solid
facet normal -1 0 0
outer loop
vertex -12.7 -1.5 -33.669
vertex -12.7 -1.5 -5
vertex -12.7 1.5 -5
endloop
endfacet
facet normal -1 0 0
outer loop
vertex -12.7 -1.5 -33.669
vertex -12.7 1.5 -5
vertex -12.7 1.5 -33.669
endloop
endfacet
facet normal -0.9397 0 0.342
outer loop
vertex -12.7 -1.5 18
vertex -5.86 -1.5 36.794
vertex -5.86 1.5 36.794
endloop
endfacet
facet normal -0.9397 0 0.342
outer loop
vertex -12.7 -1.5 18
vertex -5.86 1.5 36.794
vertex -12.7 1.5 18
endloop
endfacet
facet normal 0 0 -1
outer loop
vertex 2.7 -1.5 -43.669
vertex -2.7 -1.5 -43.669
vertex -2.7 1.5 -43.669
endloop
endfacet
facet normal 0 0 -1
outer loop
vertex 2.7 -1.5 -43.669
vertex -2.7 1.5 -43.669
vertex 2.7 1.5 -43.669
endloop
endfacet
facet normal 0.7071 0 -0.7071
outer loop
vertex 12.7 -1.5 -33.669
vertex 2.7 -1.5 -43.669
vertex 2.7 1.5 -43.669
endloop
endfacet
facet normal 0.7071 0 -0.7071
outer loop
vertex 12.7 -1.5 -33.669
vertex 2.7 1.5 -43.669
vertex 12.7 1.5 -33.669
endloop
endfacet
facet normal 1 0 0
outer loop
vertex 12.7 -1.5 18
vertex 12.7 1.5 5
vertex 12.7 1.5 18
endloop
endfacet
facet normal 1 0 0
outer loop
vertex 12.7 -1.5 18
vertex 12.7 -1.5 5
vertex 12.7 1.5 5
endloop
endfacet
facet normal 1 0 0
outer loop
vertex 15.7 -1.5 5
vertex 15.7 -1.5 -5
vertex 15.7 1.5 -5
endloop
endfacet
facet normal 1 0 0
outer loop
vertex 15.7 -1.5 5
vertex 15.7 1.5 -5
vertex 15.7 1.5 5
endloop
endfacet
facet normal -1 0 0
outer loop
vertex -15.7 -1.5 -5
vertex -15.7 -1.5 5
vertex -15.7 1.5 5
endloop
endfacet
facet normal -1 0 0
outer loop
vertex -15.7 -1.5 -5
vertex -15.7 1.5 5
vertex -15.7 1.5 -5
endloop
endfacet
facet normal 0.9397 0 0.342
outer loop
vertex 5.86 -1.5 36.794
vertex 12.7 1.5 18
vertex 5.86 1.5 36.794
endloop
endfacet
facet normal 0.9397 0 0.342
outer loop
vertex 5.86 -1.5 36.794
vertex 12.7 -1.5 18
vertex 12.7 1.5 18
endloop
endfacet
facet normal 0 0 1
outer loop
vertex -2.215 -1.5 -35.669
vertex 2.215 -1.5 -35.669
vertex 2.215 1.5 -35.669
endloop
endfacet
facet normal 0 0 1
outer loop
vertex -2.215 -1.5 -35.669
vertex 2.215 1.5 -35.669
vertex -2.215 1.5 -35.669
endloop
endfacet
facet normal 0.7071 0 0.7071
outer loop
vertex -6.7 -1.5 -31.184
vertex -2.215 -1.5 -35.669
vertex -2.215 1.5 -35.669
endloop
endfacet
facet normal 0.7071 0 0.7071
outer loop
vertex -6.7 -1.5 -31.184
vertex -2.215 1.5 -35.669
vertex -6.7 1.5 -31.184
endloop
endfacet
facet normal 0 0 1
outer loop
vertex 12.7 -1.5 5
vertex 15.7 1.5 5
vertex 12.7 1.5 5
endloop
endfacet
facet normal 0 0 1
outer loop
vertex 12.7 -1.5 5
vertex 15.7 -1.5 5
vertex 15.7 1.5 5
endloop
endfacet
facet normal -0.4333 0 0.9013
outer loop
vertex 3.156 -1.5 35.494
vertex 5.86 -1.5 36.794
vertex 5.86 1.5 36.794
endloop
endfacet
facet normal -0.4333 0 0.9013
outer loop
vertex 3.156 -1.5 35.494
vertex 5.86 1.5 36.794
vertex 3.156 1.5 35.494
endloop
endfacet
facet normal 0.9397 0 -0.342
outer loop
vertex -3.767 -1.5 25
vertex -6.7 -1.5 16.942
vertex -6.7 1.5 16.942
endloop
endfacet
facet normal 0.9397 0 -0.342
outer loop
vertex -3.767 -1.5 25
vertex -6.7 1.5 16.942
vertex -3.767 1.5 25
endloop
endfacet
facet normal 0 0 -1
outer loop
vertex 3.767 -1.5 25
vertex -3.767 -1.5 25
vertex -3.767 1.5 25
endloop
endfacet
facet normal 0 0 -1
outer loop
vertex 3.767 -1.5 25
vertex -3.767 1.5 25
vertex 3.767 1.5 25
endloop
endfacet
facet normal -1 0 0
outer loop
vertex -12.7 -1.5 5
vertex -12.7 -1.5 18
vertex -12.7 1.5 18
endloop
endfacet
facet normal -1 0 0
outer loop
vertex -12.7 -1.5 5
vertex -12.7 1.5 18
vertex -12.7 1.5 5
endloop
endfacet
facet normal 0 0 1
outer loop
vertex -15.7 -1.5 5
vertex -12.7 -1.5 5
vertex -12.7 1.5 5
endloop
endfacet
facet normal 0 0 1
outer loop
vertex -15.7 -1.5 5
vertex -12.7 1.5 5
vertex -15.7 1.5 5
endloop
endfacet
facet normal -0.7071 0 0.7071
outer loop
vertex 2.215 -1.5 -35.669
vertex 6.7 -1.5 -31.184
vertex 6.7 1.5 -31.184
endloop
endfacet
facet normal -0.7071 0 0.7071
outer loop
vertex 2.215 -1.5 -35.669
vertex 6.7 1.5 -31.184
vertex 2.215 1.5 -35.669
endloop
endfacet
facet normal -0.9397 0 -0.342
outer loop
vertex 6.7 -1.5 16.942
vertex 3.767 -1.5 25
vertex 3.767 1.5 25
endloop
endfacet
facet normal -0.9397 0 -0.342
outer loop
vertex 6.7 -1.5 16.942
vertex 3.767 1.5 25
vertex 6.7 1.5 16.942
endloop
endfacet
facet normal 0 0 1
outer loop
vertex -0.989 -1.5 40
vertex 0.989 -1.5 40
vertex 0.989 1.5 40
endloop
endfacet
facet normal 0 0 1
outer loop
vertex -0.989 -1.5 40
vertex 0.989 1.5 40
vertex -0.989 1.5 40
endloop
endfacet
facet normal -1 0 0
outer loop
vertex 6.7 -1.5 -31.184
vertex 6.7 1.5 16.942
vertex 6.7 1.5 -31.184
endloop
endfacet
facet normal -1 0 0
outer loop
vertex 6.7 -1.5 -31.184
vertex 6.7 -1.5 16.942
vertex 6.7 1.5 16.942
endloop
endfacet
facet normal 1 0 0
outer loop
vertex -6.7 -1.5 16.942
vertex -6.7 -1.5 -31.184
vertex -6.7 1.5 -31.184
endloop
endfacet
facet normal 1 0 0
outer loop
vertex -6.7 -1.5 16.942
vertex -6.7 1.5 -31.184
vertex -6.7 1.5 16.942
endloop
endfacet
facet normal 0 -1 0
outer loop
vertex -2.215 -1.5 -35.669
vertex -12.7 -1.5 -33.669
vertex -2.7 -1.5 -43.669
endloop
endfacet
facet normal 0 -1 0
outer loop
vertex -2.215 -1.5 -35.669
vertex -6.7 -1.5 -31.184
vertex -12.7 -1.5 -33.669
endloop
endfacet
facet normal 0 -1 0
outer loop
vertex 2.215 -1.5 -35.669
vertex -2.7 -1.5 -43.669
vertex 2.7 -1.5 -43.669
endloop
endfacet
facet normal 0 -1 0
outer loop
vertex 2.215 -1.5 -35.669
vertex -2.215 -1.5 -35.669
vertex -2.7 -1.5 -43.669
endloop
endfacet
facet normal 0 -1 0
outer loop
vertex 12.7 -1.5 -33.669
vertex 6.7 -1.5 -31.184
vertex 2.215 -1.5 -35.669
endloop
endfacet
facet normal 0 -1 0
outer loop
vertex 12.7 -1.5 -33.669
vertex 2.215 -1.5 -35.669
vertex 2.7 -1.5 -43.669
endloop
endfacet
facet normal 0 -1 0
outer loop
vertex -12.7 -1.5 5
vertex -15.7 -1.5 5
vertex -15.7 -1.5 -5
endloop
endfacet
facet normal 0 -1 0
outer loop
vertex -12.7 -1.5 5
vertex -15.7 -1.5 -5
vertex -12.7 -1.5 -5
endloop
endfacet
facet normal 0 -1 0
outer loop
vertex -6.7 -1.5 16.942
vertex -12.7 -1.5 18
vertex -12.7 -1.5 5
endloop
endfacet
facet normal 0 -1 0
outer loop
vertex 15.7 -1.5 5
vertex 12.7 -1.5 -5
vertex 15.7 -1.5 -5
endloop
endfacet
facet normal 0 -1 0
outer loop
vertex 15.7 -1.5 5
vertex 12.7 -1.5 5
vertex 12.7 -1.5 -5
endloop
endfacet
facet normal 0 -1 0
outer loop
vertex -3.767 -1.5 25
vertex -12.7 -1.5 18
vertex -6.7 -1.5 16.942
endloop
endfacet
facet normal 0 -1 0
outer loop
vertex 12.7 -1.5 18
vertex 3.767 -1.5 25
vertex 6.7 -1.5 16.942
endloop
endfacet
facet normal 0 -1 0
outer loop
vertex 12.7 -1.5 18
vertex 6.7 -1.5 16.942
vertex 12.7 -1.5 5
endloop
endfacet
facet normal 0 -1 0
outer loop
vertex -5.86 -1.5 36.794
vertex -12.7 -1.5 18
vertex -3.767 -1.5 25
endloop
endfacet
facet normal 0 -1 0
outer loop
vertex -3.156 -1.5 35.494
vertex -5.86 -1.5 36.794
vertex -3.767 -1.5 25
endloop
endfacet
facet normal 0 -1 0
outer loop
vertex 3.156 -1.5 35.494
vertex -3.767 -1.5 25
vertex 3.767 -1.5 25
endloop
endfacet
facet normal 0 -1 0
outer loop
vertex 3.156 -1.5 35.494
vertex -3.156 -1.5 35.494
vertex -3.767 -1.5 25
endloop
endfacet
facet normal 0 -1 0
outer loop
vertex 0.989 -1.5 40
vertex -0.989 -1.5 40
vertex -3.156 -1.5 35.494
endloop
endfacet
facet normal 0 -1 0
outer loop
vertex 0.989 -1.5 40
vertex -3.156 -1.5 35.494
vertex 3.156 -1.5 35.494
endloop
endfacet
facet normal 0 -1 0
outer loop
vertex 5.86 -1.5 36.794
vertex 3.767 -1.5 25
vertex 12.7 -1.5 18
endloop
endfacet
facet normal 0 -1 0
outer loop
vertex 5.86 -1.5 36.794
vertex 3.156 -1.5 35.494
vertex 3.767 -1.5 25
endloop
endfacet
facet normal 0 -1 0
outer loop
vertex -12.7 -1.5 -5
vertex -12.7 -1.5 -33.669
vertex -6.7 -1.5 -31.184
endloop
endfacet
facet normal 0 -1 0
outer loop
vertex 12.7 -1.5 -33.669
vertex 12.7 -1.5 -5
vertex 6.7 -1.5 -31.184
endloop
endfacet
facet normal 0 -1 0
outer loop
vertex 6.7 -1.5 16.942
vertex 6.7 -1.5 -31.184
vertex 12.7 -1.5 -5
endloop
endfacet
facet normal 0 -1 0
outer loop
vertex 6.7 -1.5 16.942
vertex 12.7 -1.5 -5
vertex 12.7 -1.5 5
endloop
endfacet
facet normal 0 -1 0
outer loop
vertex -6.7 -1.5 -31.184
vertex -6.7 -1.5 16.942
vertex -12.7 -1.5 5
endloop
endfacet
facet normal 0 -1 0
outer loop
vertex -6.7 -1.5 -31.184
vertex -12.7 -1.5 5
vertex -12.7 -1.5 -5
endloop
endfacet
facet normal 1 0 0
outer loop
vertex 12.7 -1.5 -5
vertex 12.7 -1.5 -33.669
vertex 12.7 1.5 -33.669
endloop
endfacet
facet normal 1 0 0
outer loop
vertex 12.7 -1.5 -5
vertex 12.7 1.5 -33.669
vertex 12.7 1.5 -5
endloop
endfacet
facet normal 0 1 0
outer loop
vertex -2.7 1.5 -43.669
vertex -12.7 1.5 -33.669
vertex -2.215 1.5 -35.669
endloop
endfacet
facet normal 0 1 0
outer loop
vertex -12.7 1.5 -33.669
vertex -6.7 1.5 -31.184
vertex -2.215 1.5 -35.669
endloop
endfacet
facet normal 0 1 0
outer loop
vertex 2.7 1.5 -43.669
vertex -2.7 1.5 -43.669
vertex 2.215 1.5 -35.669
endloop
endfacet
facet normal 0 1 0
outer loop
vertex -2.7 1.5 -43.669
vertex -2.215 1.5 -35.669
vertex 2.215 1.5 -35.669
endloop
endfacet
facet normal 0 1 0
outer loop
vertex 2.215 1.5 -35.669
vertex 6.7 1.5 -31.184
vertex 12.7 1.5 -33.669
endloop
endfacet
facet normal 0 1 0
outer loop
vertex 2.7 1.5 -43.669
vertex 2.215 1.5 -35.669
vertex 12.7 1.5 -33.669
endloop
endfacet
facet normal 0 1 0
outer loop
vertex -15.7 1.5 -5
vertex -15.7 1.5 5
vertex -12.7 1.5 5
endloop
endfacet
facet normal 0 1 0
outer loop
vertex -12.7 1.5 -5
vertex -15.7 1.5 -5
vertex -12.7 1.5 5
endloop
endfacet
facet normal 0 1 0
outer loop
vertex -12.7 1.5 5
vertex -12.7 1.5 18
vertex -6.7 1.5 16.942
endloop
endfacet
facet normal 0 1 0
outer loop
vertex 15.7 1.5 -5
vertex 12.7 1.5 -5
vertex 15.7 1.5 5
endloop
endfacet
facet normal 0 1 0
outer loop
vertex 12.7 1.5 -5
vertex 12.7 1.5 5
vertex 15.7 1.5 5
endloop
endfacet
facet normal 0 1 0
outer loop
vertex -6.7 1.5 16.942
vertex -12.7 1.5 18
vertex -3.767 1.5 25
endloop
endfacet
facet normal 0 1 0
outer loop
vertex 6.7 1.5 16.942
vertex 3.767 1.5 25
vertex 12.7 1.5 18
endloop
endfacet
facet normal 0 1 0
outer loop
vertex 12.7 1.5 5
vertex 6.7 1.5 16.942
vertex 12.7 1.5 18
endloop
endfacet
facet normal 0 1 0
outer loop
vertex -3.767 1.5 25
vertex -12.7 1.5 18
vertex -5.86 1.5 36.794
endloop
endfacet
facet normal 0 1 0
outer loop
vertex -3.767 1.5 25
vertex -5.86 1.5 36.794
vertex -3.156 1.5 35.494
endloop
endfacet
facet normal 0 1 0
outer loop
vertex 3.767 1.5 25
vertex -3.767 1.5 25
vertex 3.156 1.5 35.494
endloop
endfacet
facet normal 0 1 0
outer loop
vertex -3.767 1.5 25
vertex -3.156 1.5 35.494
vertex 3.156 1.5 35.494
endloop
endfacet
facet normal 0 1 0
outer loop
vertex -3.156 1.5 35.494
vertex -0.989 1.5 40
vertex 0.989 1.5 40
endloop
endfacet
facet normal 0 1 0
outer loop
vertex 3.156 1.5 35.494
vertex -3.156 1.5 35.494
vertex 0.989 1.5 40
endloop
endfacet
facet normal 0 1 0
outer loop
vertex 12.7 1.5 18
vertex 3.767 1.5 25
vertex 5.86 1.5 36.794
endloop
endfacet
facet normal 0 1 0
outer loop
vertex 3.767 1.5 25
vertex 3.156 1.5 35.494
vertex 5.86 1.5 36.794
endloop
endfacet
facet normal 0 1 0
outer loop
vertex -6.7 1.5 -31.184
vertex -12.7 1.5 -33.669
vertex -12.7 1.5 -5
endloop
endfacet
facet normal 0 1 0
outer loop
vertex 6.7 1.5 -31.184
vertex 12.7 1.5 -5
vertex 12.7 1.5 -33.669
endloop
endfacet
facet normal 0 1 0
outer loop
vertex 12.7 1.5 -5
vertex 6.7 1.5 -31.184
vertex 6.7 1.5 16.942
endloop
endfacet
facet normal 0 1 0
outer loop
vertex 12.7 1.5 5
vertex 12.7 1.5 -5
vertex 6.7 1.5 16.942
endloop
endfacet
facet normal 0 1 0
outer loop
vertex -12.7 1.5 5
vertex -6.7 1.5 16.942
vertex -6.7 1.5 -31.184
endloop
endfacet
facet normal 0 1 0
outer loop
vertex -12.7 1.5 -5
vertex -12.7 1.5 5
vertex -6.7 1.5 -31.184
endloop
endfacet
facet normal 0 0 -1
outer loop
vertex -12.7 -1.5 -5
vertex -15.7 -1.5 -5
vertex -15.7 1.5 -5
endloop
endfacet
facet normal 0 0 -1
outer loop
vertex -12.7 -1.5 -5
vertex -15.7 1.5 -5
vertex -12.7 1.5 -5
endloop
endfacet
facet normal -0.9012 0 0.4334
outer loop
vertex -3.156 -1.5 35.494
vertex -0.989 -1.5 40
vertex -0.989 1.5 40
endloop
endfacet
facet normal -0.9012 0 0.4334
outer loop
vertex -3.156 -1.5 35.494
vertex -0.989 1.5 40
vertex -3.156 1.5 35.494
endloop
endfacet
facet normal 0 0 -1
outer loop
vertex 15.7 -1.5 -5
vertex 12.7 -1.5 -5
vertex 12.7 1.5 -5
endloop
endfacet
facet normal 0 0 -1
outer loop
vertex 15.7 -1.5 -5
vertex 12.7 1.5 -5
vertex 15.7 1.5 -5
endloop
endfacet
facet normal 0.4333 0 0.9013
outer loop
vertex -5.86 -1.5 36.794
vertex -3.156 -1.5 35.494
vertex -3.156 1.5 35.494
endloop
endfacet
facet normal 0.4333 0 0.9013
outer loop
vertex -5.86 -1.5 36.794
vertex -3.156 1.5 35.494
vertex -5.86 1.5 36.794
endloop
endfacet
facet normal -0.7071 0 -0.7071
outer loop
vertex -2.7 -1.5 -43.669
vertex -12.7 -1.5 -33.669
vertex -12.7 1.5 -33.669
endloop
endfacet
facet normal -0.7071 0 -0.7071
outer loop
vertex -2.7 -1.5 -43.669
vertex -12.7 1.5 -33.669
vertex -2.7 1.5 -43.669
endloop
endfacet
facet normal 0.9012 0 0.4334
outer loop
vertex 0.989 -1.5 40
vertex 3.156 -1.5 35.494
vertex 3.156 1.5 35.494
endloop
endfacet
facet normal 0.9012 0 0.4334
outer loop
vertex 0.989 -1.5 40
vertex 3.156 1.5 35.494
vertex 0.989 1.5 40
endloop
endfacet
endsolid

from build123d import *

# Parameters (mm, degrees)
F1_DEPTH = 1.5


with BuildPart() as f1:
    # F0 (on Front) → F1 (new body, symmetric)
    with BuildSketch(Plane.XZ):
        Polygon((12.7, 18), (5.8595971335, 36.7938524157), (3.1559015792, 35.4938407428), (0.9892154577, 40), (0, 40), (-0.9892154577, 40), (-3.1559015792, 35.4938407428), (-5.8595971335, 36.7938524157), (-12.7, 18), (-12.7, 5), (-15.7, 5), (-15.7, -5), (-12.7, -5), (-12.7, -33.66908), (-2.7, -43.66908), (0, -43.66908), (2.7, -43.66908), (12.7, -33.66908), (12.7, -5), (15.7, -5), (15.7, 5), (12.7, 5), align=None)
        Polygon((6.7, -31.1837986258), (2.2147186258, -35.66908), (-2.2147186258, -35.66908), (-6.7, -31.1837986258), (-6.7, -5), (-6.7, 5), (-6.7, 16.9420381157), (-3.7671417253, 25), (3.7671417253, 25), (6.7, 16.9420381157), (6.7, 5.483887788), (6.7, -4.516112212), align=None, mode=Mode.SUBTRACT)
    extrude(amount=F1_DEPTH, both=True)


solid = f1.part
